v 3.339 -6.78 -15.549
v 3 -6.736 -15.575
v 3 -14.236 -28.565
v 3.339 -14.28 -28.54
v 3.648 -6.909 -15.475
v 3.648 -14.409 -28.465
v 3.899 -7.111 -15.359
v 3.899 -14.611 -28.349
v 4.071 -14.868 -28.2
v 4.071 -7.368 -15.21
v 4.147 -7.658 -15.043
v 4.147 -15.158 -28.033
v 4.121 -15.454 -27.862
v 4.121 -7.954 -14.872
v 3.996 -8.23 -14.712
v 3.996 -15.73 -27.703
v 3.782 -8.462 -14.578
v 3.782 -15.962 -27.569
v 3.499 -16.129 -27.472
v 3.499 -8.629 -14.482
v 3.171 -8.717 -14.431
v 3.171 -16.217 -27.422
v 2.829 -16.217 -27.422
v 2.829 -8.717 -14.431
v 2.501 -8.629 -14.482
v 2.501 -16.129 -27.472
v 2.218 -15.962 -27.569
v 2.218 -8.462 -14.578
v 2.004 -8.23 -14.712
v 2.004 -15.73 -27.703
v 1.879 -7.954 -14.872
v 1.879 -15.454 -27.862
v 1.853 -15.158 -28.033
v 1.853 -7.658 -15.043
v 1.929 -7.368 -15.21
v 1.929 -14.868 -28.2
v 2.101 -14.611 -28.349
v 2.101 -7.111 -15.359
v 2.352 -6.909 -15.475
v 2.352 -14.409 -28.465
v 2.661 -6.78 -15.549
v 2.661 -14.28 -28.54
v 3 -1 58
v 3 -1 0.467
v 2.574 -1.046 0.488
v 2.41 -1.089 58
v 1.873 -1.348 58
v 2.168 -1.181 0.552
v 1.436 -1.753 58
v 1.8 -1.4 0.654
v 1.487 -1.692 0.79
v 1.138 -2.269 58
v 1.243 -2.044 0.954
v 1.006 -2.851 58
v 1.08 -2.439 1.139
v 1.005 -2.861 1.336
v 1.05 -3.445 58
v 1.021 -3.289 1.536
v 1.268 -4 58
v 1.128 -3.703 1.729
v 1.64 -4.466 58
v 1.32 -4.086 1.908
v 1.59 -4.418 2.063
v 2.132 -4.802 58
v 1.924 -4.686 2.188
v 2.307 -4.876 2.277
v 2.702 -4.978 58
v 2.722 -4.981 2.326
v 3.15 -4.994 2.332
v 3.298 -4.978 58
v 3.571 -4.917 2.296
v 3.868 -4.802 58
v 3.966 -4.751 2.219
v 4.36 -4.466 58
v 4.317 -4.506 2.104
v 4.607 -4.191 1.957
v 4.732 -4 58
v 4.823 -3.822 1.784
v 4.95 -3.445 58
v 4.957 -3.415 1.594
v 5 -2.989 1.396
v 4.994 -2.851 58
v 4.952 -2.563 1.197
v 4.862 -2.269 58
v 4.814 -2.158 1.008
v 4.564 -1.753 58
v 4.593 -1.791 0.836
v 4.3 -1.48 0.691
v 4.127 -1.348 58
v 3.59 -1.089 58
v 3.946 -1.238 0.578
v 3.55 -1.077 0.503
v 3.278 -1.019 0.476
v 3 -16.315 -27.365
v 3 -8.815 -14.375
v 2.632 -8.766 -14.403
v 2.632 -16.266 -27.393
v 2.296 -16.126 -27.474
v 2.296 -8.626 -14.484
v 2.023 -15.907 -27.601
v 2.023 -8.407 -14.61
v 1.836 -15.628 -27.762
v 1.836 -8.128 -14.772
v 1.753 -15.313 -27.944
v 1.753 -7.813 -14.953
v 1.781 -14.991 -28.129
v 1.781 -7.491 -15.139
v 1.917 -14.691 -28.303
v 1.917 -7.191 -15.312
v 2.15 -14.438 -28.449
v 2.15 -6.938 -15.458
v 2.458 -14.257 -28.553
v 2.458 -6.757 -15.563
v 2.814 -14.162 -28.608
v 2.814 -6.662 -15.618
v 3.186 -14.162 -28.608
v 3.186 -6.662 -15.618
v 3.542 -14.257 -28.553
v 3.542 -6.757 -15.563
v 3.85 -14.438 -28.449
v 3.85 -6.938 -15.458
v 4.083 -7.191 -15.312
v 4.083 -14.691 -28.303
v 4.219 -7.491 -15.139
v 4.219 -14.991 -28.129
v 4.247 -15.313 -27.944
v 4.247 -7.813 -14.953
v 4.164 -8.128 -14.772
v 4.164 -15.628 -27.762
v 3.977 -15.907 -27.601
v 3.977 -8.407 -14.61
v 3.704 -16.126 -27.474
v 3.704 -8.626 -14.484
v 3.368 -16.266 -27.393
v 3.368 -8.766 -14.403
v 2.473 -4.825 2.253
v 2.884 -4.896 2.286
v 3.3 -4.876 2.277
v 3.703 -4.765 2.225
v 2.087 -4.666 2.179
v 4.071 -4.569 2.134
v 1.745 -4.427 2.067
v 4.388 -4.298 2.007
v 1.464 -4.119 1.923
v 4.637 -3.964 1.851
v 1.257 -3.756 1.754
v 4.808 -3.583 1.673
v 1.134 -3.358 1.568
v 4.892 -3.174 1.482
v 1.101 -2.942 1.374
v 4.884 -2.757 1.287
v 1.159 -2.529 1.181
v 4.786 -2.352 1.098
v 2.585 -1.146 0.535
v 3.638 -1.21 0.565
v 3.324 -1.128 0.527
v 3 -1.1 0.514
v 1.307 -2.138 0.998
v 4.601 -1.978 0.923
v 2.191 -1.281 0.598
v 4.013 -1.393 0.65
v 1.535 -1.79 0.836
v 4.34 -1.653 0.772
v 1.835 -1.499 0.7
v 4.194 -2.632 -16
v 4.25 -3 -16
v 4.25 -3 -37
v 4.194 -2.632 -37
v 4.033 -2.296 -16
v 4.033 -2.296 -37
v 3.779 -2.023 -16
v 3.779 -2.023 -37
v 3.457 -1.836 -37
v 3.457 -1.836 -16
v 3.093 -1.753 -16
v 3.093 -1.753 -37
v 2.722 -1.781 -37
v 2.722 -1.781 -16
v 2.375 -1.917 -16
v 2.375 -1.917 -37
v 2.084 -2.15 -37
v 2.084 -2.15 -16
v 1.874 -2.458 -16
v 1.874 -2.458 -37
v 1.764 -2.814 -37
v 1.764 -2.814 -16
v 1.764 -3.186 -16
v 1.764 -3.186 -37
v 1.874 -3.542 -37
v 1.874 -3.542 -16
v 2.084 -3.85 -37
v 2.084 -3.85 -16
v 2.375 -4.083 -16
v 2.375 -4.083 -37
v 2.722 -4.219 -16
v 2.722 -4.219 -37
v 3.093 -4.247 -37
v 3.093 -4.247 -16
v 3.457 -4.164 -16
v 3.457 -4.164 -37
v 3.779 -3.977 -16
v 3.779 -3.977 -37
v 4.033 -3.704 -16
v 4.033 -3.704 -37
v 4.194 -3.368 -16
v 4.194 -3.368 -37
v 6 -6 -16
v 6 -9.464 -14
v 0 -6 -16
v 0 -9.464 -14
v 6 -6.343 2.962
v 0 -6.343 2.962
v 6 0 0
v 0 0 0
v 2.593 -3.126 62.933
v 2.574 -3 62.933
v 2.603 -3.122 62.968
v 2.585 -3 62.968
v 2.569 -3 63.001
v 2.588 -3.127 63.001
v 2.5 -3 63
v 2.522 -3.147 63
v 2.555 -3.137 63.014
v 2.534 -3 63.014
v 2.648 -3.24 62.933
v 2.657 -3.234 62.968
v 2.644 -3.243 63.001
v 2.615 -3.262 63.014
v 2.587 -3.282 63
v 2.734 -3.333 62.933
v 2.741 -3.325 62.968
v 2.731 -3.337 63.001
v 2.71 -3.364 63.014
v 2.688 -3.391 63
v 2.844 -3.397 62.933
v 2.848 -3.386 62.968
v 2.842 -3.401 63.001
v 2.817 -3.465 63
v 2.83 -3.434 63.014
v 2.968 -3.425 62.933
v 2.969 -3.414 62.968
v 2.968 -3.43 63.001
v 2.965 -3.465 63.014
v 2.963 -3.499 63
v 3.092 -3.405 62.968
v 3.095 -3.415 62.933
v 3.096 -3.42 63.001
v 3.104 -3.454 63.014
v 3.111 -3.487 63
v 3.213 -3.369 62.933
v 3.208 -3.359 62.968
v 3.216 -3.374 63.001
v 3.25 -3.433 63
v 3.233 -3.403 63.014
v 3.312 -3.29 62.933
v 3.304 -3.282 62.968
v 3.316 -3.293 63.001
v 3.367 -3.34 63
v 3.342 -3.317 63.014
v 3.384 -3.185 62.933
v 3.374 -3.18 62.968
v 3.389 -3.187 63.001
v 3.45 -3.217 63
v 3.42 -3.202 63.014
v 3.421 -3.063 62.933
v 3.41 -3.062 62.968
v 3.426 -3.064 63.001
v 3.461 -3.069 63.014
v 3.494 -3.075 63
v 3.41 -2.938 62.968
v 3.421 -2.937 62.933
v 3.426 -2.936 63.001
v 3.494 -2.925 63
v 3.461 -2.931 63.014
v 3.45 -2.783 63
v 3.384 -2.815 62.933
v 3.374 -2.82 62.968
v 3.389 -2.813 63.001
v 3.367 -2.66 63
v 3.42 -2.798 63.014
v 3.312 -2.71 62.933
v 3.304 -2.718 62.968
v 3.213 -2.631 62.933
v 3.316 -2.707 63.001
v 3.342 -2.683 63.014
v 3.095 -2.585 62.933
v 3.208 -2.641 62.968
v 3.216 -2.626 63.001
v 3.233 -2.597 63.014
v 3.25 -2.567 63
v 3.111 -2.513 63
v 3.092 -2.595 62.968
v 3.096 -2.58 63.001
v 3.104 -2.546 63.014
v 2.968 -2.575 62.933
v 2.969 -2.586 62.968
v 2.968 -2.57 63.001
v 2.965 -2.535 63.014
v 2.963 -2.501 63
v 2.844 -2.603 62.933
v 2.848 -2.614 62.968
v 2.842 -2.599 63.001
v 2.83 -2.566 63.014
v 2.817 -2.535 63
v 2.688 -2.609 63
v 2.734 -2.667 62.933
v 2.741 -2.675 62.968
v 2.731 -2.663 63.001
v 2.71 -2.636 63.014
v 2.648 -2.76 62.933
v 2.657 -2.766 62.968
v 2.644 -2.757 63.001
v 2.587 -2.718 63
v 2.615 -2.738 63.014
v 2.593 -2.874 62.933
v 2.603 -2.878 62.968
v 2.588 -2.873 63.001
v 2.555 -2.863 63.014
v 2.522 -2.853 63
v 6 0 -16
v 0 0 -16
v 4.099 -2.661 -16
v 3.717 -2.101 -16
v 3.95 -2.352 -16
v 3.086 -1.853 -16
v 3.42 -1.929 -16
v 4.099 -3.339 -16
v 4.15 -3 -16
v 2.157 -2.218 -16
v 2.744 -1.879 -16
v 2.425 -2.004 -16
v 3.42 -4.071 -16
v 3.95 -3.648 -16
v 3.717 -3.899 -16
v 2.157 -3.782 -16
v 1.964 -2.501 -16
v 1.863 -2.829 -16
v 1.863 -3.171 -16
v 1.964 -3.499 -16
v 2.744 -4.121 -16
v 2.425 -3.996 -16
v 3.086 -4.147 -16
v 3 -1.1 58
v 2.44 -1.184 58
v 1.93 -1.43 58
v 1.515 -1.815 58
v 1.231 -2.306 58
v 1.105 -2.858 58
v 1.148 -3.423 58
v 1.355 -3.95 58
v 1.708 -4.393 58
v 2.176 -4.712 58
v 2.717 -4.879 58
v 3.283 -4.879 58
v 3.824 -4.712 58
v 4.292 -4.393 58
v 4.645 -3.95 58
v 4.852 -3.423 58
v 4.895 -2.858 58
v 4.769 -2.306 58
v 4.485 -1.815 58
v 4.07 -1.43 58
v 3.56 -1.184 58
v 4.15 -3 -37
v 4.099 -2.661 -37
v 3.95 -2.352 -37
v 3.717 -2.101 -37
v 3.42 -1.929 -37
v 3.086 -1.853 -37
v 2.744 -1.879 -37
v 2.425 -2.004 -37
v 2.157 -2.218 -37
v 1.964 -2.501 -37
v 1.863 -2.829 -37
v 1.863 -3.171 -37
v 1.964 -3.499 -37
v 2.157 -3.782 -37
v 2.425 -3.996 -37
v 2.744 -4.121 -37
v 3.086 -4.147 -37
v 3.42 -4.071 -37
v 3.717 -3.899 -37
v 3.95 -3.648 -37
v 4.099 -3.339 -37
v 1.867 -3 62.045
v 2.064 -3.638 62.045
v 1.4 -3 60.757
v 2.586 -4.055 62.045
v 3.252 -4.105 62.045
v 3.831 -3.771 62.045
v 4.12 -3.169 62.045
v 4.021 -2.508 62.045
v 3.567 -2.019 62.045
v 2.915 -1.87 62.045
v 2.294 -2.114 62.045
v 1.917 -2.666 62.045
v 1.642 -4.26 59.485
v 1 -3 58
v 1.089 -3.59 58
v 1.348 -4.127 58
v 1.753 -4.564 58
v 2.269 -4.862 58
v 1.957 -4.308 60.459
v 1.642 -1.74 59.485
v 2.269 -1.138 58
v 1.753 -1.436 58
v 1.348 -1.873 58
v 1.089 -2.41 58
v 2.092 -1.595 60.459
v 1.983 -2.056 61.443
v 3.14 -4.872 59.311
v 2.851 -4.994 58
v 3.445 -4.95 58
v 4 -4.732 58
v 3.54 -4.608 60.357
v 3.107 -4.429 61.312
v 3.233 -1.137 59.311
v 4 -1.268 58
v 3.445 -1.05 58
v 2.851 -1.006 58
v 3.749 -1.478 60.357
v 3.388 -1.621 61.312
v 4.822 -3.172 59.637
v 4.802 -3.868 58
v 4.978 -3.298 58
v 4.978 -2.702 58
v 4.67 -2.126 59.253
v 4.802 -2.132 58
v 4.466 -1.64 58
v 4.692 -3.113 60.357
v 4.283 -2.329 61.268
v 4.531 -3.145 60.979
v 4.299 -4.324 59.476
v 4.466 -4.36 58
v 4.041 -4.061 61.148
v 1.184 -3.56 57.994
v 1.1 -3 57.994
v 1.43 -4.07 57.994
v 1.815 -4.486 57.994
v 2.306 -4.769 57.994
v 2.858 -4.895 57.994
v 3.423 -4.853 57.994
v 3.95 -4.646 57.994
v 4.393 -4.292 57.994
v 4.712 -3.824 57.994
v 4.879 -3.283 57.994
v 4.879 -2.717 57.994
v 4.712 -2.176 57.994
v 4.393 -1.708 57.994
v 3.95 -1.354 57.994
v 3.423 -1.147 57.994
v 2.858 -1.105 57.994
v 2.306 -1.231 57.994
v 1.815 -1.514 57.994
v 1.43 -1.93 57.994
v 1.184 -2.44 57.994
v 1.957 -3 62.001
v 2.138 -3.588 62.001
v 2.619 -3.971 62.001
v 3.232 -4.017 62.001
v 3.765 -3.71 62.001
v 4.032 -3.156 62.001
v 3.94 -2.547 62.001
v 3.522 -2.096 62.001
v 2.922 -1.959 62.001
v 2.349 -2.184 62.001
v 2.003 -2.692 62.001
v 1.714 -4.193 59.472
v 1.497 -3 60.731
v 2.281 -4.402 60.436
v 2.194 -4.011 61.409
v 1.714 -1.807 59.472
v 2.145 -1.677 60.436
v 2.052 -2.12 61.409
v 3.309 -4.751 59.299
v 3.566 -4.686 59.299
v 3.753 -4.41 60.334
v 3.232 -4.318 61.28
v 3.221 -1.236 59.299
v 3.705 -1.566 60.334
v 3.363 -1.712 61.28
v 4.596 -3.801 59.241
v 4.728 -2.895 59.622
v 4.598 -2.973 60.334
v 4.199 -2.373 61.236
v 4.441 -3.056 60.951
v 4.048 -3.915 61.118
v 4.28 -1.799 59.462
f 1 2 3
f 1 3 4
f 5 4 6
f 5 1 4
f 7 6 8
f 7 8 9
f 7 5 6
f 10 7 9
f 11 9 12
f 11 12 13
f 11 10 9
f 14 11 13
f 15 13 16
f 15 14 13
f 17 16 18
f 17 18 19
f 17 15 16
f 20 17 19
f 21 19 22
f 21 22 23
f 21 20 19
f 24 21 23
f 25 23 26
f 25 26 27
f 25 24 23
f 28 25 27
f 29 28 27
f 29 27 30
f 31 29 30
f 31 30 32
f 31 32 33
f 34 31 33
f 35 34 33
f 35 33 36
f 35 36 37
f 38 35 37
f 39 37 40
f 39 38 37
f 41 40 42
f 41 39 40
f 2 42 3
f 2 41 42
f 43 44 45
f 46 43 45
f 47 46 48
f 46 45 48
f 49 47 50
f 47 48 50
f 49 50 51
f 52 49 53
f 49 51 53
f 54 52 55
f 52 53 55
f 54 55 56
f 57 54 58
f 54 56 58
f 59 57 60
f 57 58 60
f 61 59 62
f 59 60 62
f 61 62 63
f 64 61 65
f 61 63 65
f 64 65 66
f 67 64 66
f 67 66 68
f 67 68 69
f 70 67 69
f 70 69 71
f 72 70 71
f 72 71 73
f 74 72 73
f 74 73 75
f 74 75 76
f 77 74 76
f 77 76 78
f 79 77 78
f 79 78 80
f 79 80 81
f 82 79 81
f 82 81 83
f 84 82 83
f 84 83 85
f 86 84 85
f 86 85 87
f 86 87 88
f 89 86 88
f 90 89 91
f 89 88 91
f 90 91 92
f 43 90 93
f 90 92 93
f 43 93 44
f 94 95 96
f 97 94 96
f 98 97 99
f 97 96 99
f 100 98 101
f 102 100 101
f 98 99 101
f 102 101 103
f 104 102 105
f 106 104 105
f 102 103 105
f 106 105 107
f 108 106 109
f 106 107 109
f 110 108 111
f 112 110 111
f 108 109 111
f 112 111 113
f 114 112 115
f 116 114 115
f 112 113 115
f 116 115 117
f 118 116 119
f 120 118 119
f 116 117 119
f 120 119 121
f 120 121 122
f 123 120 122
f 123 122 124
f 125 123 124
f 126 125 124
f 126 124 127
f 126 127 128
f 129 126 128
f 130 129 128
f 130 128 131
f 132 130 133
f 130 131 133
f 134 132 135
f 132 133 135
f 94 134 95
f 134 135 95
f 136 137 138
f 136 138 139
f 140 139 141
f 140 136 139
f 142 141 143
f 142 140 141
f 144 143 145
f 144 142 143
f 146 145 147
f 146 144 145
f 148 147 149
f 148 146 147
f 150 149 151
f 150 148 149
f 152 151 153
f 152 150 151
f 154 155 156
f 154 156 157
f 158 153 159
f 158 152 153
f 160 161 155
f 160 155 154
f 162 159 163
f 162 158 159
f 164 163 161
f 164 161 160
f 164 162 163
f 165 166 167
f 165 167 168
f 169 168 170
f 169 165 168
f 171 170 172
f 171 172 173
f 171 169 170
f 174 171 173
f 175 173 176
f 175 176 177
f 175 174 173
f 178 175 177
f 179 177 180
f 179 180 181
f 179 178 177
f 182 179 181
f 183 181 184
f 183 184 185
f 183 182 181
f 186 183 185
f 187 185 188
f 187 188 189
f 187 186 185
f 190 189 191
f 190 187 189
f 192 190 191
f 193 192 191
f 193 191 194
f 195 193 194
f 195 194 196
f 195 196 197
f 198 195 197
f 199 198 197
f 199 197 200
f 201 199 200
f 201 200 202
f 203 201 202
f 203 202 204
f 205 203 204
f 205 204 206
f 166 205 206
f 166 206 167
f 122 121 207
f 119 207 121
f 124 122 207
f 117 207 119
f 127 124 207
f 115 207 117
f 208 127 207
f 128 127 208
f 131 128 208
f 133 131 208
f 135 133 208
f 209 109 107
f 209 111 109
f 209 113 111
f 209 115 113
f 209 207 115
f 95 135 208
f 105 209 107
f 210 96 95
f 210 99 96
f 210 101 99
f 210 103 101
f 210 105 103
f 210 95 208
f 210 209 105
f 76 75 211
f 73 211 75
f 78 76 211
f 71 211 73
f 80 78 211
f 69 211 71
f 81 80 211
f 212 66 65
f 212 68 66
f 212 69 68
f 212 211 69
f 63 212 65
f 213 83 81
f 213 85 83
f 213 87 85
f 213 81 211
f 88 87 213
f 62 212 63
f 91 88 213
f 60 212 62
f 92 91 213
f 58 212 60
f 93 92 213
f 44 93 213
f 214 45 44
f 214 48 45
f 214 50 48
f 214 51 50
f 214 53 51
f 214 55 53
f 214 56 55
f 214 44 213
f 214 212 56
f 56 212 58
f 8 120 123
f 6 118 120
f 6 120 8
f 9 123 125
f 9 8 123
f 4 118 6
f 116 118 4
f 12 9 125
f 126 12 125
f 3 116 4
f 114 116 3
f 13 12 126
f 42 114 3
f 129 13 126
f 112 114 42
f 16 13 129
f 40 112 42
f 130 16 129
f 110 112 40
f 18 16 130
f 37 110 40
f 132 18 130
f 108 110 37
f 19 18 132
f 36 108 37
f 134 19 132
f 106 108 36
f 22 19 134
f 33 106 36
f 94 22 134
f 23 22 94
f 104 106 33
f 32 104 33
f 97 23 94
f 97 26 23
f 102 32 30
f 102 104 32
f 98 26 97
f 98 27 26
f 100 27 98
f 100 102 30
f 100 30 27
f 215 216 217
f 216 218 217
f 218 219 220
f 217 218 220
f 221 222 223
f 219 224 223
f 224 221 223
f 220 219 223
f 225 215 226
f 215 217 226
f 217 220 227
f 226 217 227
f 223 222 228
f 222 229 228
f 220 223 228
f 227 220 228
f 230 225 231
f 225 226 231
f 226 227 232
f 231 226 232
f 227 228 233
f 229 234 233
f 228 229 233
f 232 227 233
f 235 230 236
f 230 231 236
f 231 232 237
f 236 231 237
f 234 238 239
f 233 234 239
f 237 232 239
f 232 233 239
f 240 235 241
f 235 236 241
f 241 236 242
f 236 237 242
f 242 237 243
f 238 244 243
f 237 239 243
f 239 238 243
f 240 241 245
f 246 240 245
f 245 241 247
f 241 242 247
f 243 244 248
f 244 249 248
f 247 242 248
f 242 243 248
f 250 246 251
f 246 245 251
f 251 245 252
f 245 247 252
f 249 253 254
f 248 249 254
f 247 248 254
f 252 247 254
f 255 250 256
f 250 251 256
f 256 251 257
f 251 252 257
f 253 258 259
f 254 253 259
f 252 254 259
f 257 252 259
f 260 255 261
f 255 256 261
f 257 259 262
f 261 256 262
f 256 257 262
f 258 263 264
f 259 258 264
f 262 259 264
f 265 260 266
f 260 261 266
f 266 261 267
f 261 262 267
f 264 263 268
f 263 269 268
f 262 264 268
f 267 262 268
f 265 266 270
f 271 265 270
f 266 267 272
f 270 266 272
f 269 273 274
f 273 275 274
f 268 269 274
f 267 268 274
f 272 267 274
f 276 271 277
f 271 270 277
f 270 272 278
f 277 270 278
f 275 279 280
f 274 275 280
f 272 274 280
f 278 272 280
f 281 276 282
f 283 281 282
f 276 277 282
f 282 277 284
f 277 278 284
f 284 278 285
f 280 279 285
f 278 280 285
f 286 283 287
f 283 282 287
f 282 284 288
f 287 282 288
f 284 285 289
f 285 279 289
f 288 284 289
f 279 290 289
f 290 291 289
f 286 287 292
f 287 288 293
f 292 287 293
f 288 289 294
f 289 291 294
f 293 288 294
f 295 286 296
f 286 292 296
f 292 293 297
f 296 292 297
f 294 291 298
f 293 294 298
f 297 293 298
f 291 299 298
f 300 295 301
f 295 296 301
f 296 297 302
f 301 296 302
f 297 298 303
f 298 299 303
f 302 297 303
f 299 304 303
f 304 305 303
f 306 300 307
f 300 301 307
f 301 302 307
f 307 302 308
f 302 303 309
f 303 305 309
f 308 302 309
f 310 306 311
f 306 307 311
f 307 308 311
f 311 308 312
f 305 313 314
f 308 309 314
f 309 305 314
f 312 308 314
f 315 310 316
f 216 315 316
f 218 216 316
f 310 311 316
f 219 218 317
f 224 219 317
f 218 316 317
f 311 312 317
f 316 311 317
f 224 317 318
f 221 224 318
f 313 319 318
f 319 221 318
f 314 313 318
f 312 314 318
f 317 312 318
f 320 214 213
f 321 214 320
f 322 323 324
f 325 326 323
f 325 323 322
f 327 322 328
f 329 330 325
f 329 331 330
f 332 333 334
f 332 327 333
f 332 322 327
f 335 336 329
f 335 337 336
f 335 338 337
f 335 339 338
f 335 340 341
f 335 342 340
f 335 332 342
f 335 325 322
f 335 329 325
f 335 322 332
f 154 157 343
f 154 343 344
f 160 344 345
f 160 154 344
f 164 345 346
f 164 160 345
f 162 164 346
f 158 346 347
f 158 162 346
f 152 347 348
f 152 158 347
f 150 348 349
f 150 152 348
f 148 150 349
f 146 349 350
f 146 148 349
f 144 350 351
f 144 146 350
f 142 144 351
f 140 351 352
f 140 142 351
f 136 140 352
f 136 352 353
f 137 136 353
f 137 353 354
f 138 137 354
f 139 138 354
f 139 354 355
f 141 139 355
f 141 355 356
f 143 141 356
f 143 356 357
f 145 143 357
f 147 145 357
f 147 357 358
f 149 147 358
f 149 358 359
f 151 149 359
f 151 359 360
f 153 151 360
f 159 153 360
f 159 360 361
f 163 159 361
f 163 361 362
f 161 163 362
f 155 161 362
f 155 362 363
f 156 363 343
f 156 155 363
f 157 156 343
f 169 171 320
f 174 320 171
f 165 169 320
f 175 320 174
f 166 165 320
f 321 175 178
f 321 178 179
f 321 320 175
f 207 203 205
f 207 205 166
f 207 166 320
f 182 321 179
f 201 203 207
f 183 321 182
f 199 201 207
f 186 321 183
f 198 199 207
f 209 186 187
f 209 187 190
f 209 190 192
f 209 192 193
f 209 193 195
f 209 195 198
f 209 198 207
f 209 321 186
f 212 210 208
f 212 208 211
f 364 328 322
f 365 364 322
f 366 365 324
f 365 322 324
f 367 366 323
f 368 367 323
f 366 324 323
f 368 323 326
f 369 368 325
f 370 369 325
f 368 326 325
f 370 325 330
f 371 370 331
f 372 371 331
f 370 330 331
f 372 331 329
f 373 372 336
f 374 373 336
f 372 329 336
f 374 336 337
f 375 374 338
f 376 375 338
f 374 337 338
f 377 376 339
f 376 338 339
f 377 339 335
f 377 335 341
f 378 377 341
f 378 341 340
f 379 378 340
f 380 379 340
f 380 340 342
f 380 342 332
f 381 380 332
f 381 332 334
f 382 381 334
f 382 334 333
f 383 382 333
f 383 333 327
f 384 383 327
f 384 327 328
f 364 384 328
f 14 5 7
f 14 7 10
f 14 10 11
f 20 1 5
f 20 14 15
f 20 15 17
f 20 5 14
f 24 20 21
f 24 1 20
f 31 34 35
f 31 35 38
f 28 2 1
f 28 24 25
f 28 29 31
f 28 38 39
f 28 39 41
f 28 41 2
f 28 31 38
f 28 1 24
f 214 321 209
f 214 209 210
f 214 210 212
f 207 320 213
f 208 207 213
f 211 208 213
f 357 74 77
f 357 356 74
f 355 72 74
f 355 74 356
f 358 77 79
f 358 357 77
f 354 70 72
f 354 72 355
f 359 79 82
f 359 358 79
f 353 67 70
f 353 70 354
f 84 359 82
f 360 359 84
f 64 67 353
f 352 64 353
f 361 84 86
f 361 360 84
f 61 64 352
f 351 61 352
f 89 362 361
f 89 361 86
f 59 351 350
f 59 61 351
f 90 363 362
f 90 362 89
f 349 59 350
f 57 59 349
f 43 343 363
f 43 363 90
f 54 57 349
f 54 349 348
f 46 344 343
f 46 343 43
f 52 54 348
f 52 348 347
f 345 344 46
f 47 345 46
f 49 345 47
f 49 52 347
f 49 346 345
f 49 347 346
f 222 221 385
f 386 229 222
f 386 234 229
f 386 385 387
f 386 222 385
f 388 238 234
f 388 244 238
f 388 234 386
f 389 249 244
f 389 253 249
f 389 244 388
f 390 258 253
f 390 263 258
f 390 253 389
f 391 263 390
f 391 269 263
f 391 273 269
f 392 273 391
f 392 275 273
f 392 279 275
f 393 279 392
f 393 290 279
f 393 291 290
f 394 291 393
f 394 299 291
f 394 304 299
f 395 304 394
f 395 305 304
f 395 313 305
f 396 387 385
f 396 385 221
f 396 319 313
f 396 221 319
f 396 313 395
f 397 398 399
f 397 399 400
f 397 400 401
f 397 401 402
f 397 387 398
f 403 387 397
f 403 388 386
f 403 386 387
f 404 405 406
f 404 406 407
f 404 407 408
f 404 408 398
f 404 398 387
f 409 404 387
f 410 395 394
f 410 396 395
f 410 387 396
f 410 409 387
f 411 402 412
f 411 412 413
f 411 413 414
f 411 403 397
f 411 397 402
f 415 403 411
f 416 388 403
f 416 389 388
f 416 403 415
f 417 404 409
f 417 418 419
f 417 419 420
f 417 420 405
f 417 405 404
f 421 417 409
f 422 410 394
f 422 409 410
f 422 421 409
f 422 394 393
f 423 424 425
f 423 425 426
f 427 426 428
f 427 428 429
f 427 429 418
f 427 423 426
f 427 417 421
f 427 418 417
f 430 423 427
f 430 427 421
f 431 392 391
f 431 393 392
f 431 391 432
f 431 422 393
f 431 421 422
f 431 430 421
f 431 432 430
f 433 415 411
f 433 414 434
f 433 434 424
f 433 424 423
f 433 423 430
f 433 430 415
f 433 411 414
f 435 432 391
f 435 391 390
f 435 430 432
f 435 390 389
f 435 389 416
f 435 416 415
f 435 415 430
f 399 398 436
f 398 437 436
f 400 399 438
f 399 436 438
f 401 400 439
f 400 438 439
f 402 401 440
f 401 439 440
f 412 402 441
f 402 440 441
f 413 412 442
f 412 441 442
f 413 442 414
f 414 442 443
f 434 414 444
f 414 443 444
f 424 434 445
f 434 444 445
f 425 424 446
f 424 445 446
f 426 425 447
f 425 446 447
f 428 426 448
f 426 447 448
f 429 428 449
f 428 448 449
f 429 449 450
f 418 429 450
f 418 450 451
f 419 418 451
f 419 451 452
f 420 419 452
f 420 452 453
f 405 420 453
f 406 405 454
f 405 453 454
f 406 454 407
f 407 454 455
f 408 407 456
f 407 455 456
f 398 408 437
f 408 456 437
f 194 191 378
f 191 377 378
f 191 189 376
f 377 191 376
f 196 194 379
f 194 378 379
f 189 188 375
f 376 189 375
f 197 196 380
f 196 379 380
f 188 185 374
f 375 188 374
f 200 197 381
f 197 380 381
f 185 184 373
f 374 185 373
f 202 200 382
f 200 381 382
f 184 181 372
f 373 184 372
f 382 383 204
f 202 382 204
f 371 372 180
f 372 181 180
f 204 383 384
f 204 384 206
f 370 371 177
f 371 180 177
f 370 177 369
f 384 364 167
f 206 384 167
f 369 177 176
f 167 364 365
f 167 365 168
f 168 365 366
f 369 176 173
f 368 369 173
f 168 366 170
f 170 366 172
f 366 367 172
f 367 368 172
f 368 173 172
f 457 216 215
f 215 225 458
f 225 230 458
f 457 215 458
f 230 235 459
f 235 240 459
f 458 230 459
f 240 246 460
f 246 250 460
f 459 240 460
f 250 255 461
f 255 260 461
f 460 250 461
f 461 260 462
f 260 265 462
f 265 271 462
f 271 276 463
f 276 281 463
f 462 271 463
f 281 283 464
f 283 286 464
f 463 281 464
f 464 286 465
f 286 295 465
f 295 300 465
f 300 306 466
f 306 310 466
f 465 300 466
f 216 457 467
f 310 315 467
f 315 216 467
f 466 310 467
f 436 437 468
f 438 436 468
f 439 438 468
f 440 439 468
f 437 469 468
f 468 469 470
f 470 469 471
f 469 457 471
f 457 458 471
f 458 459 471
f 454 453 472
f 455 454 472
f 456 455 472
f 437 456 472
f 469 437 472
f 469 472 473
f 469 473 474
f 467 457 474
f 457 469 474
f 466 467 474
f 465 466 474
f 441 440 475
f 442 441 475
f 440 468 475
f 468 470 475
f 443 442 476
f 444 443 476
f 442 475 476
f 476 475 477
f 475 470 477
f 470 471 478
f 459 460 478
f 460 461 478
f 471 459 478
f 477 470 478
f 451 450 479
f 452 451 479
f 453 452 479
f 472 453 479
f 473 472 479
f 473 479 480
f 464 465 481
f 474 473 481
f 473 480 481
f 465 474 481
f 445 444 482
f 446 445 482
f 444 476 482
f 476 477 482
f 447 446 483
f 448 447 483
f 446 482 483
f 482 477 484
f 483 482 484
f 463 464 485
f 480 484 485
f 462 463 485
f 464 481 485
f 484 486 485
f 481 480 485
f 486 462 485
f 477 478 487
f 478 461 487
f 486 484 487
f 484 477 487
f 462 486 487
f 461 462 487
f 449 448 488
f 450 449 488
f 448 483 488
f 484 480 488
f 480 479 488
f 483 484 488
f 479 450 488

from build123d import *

# Parameters (mm, degrees)
BOSS_EXTRUDE1_DEPTH = 6
SKETCH3_R           = 2
SKETCH3_R_2         = 1.9
BOSS_EXTRUDE2_DEPTH = 58
SKETCH3_3_R         = 1.25
SKETCH3_3_R_2       = 1.15
BOSS_EXTRUDE3_DEPTH = 37
SKETCH4_R           = 1.25
SKETCH4_R_2         = 1.15
BOSS_EXTRUDE4_DEPTH = 15


with BuildPart() as part:
    # Sketch2 → Boss-Extrude1 (new body)
    with BuildSketch(Plane(origin=(0, 0, 0), x_dir=(0, 0, -1), z_dir=(1, 0, 0))):
        Polygon((0, 0), (16, 0), (16, -6), (14, -9.464101615), (-2.961641111, -6.342608448), align=None)
    extrude(amount=BOSS_EXTRUDE1_DEPTH)

    # Sketch3 → Boss-Extrude2 (add)
    with BuildSketch(Plane.XY):
        with Locations((3, -3)):
            Circle(SKETCH3_R)
        with Locations((3, -3)):
            Circle(SKETCH3_R_2, mode=Mode.SUBTRACT)
    extrude(amount=BOSS_EXTRUDE2_DEPTH)

    # Sketch3<3> → Boss-Extrude3 (add)
    with BuildSketch(Plane.XY):
        with Locations((3, -3)):
            Circle(SKETCH3_3_R)
        with Locations((3, -3)):
            Circle(SKETCH3_3_R_2, mode=Mode.SUBTRACT)
    extrude(amount=-BOSS_EXTRUDE3_DEPTH)

    # Sketch4 → Boss-Extrude4 (add)
    with BuildSketch(Plane(origin=(0, -8.42820323, -14.598076211), x_dir=(-1, 0, 0), z_dir=(0, -0.500000000000001, -0.8660254037844382))):
        with Locations((-3, 0.803847577)):
            Circle(SKETCH4_R)
        with Locations((-3, 0.803847577)):
            Circle(SKETCH4_R_2, mode=Mode.SUBTRACT)
    extrude(amount=BOSS_EXTRUDE4_DEPTH)


with BuildPart() as body_2:
    # Sketch8 → Revolve1 (revolve)
    with BuildSketch(Plane(origin=(3, 0, 0), x_dir=(0, 0, -1), z_dir=(1, 0, 0))):
        with BuildLine():
            Line((-58, -1), (-57.994130513, -1.099827597))
            add(Edge.make_bspline(
                [(-57.994130513, -1.099827597), (-58.280311263, -1.116653948), (-58.867724332, -1.163704732), (-59.911727334, -1.299942949), (-61.0596021, -1.55463474), (-61.971470964, -1.916626175), (-62.568466051, -2.273453071), (-62.814295678, -2.466279549), (-62.93271753, -2.573980195)],
                knots=[0, 0, 0, 0, 0.125, 0.25, 0.5, 0.75, 0.875, 1, 1, 1, 1], degree=3))
            ThreePointArc((-62.93271753, -2.573980195), (-63.00123195, -2.568706073), (-63, -2.5))
            add(Edge.make_bspline(
                [(-58, -1), (-61.582271416, -1.21062408), (-63, -2.5)],
                knots=[0, 0, 0, 1, 1, 1], degree=2))
        make_face()
    revolve(axis=Axis((3, -3, 58), (0, 0, 1)))


solid = Compound([part.part, body_2.part])
